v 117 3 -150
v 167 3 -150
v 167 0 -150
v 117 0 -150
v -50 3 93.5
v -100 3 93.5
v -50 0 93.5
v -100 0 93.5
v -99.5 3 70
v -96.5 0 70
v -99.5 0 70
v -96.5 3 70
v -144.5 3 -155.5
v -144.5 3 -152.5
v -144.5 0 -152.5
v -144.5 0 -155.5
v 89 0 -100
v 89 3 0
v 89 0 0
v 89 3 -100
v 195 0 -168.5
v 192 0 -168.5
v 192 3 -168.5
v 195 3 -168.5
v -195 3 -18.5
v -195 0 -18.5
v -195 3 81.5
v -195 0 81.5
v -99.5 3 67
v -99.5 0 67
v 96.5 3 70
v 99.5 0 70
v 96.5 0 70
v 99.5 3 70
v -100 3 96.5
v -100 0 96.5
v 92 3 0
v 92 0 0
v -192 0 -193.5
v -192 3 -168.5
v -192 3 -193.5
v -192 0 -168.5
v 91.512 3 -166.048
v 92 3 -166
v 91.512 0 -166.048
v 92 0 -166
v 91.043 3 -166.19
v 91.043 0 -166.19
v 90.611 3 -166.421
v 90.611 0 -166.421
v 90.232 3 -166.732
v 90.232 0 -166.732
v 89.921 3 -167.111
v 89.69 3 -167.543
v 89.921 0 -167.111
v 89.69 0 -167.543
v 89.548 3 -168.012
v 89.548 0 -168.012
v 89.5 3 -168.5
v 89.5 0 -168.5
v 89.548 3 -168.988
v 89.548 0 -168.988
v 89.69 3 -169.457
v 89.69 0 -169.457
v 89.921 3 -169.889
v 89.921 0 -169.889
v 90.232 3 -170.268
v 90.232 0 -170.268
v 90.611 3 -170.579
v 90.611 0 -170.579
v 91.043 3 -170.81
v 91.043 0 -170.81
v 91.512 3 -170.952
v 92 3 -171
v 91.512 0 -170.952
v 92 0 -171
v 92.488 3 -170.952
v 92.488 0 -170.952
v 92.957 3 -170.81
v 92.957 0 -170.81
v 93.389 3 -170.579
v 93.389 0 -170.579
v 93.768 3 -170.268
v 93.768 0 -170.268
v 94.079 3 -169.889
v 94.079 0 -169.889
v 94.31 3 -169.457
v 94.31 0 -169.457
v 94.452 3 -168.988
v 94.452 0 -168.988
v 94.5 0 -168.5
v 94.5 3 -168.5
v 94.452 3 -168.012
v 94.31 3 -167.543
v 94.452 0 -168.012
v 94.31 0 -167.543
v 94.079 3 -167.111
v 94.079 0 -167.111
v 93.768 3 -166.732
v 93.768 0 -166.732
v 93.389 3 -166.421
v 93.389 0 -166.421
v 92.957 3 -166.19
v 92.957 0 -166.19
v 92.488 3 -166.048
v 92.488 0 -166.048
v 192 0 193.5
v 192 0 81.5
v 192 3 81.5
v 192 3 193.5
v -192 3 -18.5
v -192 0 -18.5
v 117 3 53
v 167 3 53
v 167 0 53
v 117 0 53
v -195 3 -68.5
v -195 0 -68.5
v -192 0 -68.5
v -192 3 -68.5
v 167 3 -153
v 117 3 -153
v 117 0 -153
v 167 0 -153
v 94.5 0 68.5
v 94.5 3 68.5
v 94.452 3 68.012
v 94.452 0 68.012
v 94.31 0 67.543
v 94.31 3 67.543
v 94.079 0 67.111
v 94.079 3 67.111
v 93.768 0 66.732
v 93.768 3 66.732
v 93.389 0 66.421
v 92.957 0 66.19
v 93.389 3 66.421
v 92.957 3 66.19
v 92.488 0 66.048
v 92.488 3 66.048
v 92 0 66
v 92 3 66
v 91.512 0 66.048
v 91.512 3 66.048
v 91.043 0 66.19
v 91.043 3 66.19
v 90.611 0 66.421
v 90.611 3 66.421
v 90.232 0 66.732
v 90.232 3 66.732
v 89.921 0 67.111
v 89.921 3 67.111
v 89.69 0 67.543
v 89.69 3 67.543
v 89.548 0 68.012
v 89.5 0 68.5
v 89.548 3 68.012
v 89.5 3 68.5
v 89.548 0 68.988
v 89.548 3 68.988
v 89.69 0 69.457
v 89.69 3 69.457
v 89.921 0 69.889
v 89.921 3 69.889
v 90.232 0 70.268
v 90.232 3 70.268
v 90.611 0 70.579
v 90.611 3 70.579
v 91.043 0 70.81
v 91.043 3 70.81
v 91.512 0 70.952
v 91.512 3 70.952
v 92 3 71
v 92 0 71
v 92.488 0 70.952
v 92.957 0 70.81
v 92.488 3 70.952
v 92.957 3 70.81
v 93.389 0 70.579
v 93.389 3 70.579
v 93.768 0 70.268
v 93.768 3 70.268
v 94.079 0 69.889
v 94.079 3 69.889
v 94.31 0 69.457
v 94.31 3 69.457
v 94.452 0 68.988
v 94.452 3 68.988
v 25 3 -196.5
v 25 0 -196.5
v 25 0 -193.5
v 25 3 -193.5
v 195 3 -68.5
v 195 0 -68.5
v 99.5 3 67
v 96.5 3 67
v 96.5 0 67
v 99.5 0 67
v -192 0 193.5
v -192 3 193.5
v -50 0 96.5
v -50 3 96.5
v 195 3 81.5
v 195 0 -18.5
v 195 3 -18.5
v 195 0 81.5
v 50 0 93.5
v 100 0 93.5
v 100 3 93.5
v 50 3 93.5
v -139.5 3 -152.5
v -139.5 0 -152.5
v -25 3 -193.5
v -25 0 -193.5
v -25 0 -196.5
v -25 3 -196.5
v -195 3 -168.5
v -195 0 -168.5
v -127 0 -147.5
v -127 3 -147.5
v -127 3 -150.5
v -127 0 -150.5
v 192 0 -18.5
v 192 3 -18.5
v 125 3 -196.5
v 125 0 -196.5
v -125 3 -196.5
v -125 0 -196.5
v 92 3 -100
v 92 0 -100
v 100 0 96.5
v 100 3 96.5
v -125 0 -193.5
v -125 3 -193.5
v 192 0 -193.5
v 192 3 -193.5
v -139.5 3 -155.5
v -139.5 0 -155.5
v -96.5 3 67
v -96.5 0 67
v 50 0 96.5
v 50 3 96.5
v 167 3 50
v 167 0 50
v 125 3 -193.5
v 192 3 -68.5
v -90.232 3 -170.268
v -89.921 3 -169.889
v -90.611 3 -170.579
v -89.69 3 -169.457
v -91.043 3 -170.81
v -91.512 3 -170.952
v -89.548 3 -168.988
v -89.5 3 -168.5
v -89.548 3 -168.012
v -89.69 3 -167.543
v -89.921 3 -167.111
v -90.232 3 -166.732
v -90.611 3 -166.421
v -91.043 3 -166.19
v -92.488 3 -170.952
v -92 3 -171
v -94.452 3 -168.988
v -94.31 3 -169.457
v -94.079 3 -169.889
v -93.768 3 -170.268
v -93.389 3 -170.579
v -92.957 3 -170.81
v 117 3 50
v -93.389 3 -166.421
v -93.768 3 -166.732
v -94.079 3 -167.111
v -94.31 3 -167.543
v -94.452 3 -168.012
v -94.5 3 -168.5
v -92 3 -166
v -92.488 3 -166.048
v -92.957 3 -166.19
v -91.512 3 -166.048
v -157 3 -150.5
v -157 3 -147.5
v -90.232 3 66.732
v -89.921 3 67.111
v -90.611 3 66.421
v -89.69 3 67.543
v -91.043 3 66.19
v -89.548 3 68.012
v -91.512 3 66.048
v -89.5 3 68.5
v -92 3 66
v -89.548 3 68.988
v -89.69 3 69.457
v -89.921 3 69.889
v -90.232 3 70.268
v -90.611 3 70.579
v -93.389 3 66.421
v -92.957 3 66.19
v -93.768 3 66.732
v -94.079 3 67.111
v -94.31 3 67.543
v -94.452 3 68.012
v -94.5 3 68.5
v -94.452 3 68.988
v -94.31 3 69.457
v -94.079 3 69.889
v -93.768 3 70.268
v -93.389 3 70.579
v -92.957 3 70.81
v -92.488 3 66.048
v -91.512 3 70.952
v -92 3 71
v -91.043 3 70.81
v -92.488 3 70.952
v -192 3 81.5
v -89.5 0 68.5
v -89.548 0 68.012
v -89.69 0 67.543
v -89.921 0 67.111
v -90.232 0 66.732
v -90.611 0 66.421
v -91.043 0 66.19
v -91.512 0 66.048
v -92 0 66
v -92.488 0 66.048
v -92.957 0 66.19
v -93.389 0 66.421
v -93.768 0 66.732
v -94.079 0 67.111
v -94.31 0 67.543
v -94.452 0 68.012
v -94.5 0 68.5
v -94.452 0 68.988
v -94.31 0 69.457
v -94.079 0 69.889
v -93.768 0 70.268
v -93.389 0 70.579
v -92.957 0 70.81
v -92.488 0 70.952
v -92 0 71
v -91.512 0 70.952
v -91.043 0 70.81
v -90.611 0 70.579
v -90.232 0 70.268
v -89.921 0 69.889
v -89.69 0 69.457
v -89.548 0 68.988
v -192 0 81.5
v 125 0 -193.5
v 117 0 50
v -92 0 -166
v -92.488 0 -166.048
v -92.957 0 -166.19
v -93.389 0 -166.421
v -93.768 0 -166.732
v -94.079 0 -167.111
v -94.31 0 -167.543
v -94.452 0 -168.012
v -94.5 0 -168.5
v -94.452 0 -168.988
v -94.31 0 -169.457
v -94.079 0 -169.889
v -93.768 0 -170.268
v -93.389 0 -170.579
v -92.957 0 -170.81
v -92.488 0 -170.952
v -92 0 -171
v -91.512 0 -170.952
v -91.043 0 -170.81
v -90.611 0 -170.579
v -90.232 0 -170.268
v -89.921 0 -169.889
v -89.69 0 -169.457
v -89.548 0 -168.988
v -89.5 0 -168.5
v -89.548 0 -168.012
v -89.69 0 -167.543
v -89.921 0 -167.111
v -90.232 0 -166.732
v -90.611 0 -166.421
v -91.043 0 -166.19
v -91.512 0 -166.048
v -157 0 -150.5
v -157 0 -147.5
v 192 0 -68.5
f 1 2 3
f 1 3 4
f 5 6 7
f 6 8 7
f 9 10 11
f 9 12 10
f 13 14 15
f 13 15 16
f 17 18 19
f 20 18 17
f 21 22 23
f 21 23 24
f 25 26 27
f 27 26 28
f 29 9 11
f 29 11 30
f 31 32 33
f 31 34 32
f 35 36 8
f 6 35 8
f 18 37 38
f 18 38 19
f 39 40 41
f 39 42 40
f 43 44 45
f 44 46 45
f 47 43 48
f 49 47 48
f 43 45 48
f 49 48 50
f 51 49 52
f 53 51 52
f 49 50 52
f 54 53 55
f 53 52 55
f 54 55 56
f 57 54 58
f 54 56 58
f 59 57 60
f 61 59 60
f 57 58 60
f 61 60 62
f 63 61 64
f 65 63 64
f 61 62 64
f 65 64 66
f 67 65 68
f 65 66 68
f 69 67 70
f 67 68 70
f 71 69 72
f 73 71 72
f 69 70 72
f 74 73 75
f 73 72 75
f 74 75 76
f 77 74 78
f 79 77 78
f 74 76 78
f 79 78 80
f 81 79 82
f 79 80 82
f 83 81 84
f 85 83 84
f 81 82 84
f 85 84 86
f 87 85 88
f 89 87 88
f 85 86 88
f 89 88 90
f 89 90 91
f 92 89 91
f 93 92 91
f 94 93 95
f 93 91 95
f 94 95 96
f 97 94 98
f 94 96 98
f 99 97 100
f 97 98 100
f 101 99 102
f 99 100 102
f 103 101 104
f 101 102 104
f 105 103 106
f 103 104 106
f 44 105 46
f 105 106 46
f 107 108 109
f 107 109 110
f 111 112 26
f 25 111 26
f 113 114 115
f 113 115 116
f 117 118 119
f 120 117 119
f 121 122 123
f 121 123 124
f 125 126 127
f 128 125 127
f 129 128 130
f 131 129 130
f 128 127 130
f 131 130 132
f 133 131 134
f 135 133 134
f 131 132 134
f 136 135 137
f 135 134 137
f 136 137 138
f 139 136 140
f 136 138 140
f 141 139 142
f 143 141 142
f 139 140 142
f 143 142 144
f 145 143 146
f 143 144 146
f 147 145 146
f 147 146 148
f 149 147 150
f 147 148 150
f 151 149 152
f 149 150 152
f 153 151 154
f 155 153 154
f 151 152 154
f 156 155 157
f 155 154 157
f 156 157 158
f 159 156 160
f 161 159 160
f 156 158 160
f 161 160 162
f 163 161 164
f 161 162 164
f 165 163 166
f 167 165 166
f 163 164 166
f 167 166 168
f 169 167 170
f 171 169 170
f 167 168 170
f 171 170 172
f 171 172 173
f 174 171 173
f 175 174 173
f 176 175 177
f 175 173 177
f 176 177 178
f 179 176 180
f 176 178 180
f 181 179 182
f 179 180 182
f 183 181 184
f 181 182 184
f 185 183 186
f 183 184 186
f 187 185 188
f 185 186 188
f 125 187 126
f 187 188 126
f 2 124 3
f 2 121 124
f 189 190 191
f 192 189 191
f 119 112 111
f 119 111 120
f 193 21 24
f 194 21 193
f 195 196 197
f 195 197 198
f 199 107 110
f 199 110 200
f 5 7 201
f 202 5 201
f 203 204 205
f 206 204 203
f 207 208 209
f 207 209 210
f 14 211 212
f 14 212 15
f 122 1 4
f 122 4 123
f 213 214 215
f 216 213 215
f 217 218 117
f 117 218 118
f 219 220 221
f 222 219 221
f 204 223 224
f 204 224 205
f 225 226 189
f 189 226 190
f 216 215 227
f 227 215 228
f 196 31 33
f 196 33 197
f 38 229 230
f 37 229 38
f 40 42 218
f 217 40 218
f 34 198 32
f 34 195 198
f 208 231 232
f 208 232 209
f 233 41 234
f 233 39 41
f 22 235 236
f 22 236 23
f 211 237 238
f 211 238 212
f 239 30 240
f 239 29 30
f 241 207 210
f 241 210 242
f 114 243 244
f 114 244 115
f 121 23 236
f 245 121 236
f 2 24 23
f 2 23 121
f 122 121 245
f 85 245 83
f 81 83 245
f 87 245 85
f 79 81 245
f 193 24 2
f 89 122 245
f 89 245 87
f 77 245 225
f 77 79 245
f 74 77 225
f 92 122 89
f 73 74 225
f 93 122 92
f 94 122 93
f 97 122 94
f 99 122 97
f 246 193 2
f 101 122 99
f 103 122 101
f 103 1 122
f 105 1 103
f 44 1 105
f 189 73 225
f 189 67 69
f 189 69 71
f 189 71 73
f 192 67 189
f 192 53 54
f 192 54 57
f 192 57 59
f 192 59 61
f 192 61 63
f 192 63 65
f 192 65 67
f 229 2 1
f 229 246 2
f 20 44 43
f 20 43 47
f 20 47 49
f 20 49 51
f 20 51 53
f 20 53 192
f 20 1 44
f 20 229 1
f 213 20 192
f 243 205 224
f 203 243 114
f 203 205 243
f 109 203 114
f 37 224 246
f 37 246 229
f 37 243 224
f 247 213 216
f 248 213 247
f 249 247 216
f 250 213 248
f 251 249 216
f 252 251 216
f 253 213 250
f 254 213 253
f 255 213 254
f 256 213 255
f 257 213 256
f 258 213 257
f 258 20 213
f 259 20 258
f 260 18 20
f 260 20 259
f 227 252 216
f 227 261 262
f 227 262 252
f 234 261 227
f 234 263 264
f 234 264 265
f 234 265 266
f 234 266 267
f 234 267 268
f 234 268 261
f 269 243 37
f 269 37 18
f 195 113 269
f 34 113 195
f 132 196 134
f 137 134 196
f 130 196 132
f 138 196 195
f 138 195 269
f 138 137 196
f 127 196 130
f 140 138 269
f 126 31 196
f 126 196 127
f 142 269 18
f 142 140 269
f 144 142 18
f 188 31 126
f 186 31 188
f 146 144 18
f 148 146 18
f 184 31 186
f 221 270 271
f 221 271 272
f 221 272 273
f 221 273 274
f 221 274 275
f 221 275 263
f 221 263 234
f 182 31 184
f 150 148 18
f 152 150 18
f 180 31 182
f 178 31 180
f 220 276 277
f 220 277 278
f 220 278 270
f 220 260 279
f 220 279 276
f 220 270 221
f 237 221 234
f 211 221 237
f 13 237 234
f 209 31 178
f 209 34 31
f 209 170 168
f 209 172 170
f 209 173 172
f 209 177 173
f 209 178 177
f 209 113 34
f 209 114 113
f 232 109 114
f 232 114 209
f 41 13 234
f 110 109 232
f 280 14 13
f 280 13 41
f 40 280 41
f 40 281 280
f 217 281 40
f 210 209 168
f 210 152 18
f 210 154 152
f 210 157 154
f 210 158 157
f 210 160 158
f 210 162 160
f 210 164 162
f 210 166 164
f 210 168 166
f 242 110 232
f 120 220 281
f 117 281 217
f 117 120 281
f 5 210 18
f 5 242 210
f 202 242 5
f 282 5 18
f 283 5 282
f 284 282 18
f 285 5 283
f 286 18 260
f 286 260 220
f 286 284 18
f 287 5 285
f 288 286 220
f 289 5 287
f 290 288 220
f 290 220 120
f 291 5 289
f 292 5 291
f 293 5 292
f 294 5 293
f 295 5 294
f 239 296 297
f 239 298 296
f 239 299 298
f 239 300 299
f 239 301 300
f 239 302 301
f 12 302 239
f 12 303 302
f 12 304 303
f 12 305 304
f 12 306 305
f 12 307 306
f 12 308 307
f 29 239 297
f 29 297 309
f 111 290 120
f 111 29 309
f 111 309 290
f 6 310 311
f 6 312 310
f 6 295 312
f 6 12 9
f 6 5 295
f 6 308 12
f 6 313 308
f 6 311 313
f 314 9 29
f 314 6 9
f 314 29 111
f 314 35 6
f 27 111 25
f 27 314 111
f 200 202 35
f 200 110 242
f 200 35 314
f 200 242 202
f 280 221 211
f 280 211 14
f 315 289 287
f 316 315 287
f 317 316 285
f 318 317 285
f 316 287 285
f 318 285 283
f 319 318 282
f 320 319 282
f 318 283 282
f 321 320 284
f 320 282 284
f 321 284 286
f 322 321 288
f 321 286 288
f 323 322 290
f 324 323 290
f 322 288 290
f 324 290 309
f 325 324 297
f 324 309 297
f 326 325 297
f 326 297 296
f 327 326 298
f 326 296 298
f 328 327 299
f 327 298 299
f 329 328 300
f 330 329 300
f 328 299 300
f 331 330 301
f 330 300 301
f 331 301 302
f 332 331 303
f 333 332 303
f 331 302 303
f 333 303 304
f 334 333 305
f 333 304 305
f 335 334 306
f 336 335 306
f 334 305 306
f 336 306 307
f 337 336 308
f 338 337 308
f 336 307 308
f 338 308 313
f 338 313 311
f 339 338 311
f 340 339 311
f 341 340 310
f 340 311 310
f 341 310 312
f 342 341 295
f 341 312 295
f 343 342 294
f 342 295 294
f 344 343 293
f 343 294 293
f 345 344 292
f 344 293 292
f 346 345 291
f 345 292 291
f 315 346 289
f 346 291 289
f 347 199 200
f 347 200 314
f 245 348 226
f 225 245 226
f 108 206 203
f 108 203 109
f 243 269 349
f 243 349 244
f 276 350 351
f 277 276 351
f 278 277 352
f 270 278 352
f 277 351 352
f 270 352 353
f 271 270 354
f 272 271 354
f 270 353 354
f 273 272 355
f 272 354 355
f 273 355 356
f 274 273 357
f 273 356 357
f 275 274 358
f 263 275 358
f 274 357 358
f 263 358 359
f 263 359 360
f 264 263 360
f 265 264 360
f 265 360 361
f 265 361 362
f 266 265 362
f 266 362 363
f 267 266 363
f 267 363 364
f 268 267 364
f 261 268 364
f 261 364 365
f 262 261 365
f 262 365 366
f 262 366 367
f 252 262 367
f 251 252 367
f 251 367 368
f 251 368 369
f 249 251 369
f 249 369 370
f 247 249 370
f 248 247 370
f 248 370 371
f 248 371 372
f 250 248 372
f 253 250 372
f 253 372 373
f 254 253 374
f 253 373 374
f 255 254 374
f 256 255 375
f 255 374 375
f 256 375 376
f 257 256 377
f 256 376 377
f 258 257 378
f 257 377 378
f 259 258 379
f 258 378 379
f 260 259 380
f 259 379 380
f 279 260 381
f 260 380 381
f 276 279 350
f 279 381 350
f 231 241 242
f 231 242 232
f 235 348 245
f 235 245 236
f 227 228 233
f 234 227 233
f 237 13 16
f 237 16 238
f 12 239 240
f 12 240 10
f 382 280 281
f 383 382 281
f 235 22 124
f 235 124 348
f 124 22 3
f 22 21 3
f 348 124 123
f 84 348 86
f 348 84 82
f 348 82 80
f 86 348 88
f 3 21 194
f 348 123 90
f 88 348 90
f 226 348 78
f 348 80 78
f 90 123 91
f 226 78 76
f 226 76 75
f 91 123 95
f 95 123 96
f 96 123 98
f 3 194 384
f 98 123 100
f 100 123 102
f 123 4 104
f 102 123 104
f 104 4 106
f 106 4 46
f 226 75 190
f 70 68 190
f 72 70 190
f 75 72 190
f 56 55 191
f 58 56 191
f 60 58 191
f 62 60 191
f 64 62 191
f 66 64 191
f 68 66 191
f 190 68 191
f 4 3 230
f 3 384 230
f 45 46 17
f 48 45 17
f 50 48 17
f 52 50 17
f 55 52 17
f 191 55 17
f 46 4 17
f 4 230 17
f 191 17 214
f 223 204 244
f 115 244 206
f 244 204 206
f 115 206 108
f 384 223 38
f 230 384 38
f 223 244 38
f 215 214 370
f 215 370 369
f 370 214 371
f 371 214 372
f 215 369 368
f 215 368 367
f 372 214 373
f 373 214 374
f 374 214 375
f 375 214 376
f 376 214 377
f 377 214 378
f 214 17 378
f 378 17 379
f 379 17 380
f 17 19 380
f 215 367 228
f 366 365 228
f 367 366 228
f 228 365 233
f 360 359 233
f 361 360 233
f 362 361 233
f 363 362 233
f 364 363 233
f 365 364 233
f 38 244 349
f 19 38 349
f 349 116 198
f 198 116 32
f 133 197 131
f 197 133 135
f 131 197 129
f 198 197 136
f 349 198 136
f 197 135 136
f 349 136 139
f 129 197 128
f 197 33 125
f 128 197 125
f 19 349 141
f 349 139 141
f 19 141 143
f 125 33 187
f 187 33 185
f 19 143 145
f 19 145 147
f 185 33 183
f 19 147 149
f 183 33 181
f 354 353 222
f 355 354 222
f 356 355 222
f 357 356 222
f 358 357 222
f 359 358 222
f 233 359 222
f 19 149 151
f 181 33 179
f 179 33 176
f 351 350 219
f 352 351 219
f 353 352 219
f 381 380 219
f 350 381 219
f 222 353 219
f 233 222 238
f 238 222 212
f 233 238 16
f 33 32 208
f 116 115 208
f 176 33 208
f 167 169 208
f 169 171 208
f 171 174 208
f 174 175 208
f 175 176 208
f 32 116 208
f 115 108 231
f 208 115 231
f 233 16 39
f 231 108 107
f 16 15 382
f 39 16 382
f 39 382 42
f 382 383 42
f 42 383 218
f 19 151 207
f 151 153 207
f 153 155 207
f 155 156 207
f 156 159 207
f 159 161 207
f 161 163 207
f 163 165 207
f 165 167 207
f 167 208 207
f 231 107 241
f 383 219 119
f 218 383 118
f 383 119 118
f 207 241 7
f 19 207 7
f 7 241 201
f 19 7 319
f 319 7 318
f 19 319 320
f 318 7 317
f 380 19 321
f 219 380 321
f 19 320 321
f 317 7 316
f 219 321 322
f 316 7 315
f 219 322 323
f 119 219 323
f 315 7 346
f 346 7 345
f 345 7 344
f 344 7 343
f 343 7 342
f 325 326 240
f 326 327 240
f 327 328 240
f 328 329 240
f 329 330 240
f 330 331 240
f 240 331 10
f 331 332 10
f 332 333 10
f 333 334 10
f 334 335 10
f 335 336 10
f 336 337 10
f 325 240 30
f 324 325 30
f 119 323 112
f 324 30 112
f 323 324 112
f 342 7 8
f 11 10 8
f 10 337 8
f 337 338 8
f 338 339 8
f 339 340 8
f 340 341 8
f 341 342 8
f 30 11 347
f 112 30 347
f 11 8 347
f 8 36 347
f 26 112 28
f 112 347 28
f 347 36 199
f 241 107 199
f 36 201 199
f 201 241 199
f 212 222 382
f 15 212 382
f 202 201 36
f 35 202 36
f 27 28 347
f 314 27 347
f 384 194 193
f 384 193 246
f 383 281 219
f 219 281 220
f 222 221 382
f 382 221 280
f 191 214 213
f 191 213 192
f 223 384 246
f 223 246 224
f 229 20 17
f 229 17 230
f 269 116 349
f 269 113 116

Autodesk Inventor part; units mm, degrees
ref_plane "YZ Plane" through (0, 0, 0) normal (1, 0, 0) x (0, 1, 0)
ref_plane "XZ Plane" through (0, 0, 0) normal (0, 1, 0) x (-1, 0, 0)
ref_plane "XY Plane" through (0, 0, 0) normal (0, 0, 1) x (1, 0, 0)
sketch "Boceto1" plane through (0, 0, 0) normal (0, 1, 0) x (-1, 0, 0)
  line L0 (-192, 193.5) -> (192, -193.5) construction
  line L1 (192, 193.5) -> (-192, -193.5) construction
  line L2 (-192, -168.5) -> (-195, -168.5)
  line L3 (-195, -168.5) -> (-195, -68.5)
  line L4 (-195, -68.5) -> (-192, -68.5)
  line L5 (-192, -193.5) -> (-192, -168.5)
  line L6 (-192, -18.5) -> (-195, -18.5)
  line L7 (-195, -18.5) -> (-195, 81.5)
  line L8 (-195, 81.5) -> (-192, 81.5)
  line L9 (-192, -68.5) -> (-192, -18.5)
  line L10 (-192, 81.5) -> (-192, 193.5)
  line L11 (100, 93.5) -> (50, 93.5)
  line L12 (50, 93.5) -> (50, 96.5)
  line L13 (50, 96.5) -> (100, 96.5)
  line L14 (100, 96.5) -> (100, 93.5)
  line L15 (-50, 96.5) -> (-100, 96.5)
  line L16 (-100, 96.5) -> (-100, 93.5)
  line L17 (-100, 93.5) -> (-50, 93.5)
  line L18 (-50, 93.5) -> (-50, 96.5)
  line L19 (-125, -193.5) -> (-125, -196.5)
  line L20 (-125, -196.5) -> (-25, -196.5)
  line L21 (-25, -196.5) -> (-25, -193.5)
  line L22 (25, -193.5) -> (25, -196.5)
  line L23 (25, -196.5) -> (125, -196.5)
  line L24 (125, -196.5) -> (125, -193.5)
  line L25 (-125, -193.5) -> (-192, -193.5)
  line L26 (192, -193.5) -> (125, -193.5)
  line L27 (25, -193.5) -> (-25, -193.5)
  line L28 (-192, 193.5) -> (192, 193.5)
  line L29 (192, -168.5) -> (195, -168.5)
  line L30 (195, -168.5) -> (195, -68.5)
  line L31 (195, -68.5) -> (192, -68.5)
  line L32 (192, -18.5) -> (195, -18.5)
  line L33 (195, -18.5) -> (195, 81.5)
  line L34 (195, 81.5) -> (192, 81.5)
  line L35 (192, -168.5) -> (192, -193.5)
  line L36 (192, 193.5) -> (192, 81.5)
  line L37 (192, -18.5) -> (192, -68.5)
  point P0 (0, 0)
  dimension "d5" = 100
  dimension "d7" = 100
  dimension "d8" = 50
  dimension "d9" = 3
  dimension "d12" = 50
  dimension "d13" = 3
  dimension "d14" = 100
  dimension "d59" = 100
  dimension "d61" = 100
  dimension "d63" = 50
  dimension "d64" = 3
  dimension "d75" = 25
  dimension "d76" = 50
  dimension "d77" = 100
  dimension "d78" = 3
  dimension "d79" = 3
  dimension "d81" = 3
  dimension "d83" = 390
  dimension "d84" = 390
  dimension "d85" = 67
extrude "Extrusión2" add sketch "Boceto1" along normal blind 3
sketch "Boceto2" plane through (0, 3, 0) normal (0, 1, 0) x (1, 0, 0)
  line L0 (72, -93.5) -> (72, 193.5) construction
  line L1 (192, 193.5) -> (-192, 193.5) projected
  line L2 (50, -93.5) -> (100, -93.5) projected
  line L3 (72, 50) -> (192, 50) construction
  line L4 (192, 18.5) -> (192, 68.5) projected
  line L5 (117, 153) -> (167, 153)
  line L6 (167, 153) -> (167, 150)
  line L7 (167, 150) -> (117, 150)
  line L8 (117, 150) -> (117, 153)
  line L9 (117, -50) -> (167, -50)
  line L10 (167, -50) -> (167, -53)
  line L11 (167, -53) -> (117, -53)
  line L12 (117, -53) -> (117, -50)
  line L13 (89, 100) -> (92, 100)
  line L14 (92, 100) -> (92, 0)
  line L15 (92, 0) -> (89, 0)
  line L16 (89, 0) -> (89, 100)
  point P0 (0, 0)
  point P1 (92, 50)
  dimension "d18" = 120
  dimension "d19" = 50
  dimension "d20" = 3
  dimension "d21" = 50
  dimension "d22" = 3
  dimension "d23" = 100
  dimension "d24" = 100
  dimension "d25" = 25
  dimension "d26" = 3
  dimension "d27" = 100
  dimension "d28" = 28
extrude "Extrusión3" cut sketch "Boceto2" against normal blind 3
hole "Agujero1" at (92, 3, -168.5) direction (0, -1, 0) diameter 5 end through all
hole "Agujero2" at (-92, 3, -168.5) direction (0, -1, 0) diameter 5 end through all
sketch "Boceto3" plane through (0, 3, 0) normal (0, 1, 0) x (1, 0, 0)
  circle A0 centre (92, -68.5) radius 2.5
  circle A1 centre (-92, -68.5) radius 2.5
  line L0 (-192, 193.5) -> (-192, -193.5) projected
  line L1 (192, -193.5) -> (192, -81.5) projected
  line L2 (-100, -93.5) -> (-50, -93.5) projected
  line L3 (99.5, -70) -> (96.5, -70)
  line L4 (96.5, -70) -> (96.5, -67)
  line L5 (96.5, -67) -> (99.5, -67)
  line L6 (99.5, -67) -> (99.5, -70)
  line L7 (-96.5, -70) -> (-99.5, -70)
  line L8 (-99.5, -70) -> (-99.5, -67)
  line L9 (-99.5, -67) -> (-96.5, -67)
  line L10 (-96.5, -67) -> (-96.5, -70)
  point P0 (0, 0)
  point P1 (99.5, -68.5)
  point P2 (-96.5, -68.5)
  dimension "d49" = 5
  dimension "d50" = 5
  dimension "d51" = 100
  dimension "d52" = 25
  dimension "d54" = 100
  dimension "d98" = 3
  dimension "d99" = 3
  dimension "d101" = 4.5
  dimension "d102" = 3
  dimension "d103" = 3
  dimension "d105" = 4.5
extrude "Extrusión4" cut sketch "Boceto3" against normal blind 3
sketch "Boceto4" plane through (0, 3, 0) normal (0, 1, 0) x (1, 0, 0)
  line L0 (-127, 150.5) -> (-157, 150.5)
  line L1 (-157, 150.5) -> (-157, 147.5)
  line L2 (-157, 147.5) -> (-127, 147.5)
  line L3 (-127, 147.5) -> (-127, 150.5)
  line L4 (-192, 193.5) -> (-192, 168.5) projected
  line L5 (-127, -46.5) -> (-157, -46.5)
  line L6 (-157, -46.5) -> (-157, -49.5)
  line L7 (-157, -49.5) -> (-127, -49.5)
  line L8 (-127, -49.5) -> (-127, -46.5)
  line L9 (-125, 193.5) -> (-192, 193.5) projected
  line L10 (-139.5, 152.5) -> (-144.5, 152.5)
  line L11 (-144.5, 152.5) -> (-144.5, 155.5)
  line L12 (-144.5, 155.5) -> (-139.5, 155.5)
  line L13 (-139.5, 155.5) -> (-139.5, 152.5)
  point P0 (0, 0)
  point P1 (-142, 152.5)
  point P2 (-142, 150.5)
  dimension "d86" = 30
  dimension "d87" = 3
  dimension "d88" = 35
  dimension "d89" = 30
  dimension "d90" = 3
  dimension "d93" = 194
  dimension "d94" = 43
  dimension "d95" = 5
  dimension "d96" = 3
  dimension "d97" = 2
extrude "Extrusión5" cut sketch "Boceto4" against normal blind 3 contours L3 L2 L1 L0 | L10 L11 L12 L13
properties part number "Base"
